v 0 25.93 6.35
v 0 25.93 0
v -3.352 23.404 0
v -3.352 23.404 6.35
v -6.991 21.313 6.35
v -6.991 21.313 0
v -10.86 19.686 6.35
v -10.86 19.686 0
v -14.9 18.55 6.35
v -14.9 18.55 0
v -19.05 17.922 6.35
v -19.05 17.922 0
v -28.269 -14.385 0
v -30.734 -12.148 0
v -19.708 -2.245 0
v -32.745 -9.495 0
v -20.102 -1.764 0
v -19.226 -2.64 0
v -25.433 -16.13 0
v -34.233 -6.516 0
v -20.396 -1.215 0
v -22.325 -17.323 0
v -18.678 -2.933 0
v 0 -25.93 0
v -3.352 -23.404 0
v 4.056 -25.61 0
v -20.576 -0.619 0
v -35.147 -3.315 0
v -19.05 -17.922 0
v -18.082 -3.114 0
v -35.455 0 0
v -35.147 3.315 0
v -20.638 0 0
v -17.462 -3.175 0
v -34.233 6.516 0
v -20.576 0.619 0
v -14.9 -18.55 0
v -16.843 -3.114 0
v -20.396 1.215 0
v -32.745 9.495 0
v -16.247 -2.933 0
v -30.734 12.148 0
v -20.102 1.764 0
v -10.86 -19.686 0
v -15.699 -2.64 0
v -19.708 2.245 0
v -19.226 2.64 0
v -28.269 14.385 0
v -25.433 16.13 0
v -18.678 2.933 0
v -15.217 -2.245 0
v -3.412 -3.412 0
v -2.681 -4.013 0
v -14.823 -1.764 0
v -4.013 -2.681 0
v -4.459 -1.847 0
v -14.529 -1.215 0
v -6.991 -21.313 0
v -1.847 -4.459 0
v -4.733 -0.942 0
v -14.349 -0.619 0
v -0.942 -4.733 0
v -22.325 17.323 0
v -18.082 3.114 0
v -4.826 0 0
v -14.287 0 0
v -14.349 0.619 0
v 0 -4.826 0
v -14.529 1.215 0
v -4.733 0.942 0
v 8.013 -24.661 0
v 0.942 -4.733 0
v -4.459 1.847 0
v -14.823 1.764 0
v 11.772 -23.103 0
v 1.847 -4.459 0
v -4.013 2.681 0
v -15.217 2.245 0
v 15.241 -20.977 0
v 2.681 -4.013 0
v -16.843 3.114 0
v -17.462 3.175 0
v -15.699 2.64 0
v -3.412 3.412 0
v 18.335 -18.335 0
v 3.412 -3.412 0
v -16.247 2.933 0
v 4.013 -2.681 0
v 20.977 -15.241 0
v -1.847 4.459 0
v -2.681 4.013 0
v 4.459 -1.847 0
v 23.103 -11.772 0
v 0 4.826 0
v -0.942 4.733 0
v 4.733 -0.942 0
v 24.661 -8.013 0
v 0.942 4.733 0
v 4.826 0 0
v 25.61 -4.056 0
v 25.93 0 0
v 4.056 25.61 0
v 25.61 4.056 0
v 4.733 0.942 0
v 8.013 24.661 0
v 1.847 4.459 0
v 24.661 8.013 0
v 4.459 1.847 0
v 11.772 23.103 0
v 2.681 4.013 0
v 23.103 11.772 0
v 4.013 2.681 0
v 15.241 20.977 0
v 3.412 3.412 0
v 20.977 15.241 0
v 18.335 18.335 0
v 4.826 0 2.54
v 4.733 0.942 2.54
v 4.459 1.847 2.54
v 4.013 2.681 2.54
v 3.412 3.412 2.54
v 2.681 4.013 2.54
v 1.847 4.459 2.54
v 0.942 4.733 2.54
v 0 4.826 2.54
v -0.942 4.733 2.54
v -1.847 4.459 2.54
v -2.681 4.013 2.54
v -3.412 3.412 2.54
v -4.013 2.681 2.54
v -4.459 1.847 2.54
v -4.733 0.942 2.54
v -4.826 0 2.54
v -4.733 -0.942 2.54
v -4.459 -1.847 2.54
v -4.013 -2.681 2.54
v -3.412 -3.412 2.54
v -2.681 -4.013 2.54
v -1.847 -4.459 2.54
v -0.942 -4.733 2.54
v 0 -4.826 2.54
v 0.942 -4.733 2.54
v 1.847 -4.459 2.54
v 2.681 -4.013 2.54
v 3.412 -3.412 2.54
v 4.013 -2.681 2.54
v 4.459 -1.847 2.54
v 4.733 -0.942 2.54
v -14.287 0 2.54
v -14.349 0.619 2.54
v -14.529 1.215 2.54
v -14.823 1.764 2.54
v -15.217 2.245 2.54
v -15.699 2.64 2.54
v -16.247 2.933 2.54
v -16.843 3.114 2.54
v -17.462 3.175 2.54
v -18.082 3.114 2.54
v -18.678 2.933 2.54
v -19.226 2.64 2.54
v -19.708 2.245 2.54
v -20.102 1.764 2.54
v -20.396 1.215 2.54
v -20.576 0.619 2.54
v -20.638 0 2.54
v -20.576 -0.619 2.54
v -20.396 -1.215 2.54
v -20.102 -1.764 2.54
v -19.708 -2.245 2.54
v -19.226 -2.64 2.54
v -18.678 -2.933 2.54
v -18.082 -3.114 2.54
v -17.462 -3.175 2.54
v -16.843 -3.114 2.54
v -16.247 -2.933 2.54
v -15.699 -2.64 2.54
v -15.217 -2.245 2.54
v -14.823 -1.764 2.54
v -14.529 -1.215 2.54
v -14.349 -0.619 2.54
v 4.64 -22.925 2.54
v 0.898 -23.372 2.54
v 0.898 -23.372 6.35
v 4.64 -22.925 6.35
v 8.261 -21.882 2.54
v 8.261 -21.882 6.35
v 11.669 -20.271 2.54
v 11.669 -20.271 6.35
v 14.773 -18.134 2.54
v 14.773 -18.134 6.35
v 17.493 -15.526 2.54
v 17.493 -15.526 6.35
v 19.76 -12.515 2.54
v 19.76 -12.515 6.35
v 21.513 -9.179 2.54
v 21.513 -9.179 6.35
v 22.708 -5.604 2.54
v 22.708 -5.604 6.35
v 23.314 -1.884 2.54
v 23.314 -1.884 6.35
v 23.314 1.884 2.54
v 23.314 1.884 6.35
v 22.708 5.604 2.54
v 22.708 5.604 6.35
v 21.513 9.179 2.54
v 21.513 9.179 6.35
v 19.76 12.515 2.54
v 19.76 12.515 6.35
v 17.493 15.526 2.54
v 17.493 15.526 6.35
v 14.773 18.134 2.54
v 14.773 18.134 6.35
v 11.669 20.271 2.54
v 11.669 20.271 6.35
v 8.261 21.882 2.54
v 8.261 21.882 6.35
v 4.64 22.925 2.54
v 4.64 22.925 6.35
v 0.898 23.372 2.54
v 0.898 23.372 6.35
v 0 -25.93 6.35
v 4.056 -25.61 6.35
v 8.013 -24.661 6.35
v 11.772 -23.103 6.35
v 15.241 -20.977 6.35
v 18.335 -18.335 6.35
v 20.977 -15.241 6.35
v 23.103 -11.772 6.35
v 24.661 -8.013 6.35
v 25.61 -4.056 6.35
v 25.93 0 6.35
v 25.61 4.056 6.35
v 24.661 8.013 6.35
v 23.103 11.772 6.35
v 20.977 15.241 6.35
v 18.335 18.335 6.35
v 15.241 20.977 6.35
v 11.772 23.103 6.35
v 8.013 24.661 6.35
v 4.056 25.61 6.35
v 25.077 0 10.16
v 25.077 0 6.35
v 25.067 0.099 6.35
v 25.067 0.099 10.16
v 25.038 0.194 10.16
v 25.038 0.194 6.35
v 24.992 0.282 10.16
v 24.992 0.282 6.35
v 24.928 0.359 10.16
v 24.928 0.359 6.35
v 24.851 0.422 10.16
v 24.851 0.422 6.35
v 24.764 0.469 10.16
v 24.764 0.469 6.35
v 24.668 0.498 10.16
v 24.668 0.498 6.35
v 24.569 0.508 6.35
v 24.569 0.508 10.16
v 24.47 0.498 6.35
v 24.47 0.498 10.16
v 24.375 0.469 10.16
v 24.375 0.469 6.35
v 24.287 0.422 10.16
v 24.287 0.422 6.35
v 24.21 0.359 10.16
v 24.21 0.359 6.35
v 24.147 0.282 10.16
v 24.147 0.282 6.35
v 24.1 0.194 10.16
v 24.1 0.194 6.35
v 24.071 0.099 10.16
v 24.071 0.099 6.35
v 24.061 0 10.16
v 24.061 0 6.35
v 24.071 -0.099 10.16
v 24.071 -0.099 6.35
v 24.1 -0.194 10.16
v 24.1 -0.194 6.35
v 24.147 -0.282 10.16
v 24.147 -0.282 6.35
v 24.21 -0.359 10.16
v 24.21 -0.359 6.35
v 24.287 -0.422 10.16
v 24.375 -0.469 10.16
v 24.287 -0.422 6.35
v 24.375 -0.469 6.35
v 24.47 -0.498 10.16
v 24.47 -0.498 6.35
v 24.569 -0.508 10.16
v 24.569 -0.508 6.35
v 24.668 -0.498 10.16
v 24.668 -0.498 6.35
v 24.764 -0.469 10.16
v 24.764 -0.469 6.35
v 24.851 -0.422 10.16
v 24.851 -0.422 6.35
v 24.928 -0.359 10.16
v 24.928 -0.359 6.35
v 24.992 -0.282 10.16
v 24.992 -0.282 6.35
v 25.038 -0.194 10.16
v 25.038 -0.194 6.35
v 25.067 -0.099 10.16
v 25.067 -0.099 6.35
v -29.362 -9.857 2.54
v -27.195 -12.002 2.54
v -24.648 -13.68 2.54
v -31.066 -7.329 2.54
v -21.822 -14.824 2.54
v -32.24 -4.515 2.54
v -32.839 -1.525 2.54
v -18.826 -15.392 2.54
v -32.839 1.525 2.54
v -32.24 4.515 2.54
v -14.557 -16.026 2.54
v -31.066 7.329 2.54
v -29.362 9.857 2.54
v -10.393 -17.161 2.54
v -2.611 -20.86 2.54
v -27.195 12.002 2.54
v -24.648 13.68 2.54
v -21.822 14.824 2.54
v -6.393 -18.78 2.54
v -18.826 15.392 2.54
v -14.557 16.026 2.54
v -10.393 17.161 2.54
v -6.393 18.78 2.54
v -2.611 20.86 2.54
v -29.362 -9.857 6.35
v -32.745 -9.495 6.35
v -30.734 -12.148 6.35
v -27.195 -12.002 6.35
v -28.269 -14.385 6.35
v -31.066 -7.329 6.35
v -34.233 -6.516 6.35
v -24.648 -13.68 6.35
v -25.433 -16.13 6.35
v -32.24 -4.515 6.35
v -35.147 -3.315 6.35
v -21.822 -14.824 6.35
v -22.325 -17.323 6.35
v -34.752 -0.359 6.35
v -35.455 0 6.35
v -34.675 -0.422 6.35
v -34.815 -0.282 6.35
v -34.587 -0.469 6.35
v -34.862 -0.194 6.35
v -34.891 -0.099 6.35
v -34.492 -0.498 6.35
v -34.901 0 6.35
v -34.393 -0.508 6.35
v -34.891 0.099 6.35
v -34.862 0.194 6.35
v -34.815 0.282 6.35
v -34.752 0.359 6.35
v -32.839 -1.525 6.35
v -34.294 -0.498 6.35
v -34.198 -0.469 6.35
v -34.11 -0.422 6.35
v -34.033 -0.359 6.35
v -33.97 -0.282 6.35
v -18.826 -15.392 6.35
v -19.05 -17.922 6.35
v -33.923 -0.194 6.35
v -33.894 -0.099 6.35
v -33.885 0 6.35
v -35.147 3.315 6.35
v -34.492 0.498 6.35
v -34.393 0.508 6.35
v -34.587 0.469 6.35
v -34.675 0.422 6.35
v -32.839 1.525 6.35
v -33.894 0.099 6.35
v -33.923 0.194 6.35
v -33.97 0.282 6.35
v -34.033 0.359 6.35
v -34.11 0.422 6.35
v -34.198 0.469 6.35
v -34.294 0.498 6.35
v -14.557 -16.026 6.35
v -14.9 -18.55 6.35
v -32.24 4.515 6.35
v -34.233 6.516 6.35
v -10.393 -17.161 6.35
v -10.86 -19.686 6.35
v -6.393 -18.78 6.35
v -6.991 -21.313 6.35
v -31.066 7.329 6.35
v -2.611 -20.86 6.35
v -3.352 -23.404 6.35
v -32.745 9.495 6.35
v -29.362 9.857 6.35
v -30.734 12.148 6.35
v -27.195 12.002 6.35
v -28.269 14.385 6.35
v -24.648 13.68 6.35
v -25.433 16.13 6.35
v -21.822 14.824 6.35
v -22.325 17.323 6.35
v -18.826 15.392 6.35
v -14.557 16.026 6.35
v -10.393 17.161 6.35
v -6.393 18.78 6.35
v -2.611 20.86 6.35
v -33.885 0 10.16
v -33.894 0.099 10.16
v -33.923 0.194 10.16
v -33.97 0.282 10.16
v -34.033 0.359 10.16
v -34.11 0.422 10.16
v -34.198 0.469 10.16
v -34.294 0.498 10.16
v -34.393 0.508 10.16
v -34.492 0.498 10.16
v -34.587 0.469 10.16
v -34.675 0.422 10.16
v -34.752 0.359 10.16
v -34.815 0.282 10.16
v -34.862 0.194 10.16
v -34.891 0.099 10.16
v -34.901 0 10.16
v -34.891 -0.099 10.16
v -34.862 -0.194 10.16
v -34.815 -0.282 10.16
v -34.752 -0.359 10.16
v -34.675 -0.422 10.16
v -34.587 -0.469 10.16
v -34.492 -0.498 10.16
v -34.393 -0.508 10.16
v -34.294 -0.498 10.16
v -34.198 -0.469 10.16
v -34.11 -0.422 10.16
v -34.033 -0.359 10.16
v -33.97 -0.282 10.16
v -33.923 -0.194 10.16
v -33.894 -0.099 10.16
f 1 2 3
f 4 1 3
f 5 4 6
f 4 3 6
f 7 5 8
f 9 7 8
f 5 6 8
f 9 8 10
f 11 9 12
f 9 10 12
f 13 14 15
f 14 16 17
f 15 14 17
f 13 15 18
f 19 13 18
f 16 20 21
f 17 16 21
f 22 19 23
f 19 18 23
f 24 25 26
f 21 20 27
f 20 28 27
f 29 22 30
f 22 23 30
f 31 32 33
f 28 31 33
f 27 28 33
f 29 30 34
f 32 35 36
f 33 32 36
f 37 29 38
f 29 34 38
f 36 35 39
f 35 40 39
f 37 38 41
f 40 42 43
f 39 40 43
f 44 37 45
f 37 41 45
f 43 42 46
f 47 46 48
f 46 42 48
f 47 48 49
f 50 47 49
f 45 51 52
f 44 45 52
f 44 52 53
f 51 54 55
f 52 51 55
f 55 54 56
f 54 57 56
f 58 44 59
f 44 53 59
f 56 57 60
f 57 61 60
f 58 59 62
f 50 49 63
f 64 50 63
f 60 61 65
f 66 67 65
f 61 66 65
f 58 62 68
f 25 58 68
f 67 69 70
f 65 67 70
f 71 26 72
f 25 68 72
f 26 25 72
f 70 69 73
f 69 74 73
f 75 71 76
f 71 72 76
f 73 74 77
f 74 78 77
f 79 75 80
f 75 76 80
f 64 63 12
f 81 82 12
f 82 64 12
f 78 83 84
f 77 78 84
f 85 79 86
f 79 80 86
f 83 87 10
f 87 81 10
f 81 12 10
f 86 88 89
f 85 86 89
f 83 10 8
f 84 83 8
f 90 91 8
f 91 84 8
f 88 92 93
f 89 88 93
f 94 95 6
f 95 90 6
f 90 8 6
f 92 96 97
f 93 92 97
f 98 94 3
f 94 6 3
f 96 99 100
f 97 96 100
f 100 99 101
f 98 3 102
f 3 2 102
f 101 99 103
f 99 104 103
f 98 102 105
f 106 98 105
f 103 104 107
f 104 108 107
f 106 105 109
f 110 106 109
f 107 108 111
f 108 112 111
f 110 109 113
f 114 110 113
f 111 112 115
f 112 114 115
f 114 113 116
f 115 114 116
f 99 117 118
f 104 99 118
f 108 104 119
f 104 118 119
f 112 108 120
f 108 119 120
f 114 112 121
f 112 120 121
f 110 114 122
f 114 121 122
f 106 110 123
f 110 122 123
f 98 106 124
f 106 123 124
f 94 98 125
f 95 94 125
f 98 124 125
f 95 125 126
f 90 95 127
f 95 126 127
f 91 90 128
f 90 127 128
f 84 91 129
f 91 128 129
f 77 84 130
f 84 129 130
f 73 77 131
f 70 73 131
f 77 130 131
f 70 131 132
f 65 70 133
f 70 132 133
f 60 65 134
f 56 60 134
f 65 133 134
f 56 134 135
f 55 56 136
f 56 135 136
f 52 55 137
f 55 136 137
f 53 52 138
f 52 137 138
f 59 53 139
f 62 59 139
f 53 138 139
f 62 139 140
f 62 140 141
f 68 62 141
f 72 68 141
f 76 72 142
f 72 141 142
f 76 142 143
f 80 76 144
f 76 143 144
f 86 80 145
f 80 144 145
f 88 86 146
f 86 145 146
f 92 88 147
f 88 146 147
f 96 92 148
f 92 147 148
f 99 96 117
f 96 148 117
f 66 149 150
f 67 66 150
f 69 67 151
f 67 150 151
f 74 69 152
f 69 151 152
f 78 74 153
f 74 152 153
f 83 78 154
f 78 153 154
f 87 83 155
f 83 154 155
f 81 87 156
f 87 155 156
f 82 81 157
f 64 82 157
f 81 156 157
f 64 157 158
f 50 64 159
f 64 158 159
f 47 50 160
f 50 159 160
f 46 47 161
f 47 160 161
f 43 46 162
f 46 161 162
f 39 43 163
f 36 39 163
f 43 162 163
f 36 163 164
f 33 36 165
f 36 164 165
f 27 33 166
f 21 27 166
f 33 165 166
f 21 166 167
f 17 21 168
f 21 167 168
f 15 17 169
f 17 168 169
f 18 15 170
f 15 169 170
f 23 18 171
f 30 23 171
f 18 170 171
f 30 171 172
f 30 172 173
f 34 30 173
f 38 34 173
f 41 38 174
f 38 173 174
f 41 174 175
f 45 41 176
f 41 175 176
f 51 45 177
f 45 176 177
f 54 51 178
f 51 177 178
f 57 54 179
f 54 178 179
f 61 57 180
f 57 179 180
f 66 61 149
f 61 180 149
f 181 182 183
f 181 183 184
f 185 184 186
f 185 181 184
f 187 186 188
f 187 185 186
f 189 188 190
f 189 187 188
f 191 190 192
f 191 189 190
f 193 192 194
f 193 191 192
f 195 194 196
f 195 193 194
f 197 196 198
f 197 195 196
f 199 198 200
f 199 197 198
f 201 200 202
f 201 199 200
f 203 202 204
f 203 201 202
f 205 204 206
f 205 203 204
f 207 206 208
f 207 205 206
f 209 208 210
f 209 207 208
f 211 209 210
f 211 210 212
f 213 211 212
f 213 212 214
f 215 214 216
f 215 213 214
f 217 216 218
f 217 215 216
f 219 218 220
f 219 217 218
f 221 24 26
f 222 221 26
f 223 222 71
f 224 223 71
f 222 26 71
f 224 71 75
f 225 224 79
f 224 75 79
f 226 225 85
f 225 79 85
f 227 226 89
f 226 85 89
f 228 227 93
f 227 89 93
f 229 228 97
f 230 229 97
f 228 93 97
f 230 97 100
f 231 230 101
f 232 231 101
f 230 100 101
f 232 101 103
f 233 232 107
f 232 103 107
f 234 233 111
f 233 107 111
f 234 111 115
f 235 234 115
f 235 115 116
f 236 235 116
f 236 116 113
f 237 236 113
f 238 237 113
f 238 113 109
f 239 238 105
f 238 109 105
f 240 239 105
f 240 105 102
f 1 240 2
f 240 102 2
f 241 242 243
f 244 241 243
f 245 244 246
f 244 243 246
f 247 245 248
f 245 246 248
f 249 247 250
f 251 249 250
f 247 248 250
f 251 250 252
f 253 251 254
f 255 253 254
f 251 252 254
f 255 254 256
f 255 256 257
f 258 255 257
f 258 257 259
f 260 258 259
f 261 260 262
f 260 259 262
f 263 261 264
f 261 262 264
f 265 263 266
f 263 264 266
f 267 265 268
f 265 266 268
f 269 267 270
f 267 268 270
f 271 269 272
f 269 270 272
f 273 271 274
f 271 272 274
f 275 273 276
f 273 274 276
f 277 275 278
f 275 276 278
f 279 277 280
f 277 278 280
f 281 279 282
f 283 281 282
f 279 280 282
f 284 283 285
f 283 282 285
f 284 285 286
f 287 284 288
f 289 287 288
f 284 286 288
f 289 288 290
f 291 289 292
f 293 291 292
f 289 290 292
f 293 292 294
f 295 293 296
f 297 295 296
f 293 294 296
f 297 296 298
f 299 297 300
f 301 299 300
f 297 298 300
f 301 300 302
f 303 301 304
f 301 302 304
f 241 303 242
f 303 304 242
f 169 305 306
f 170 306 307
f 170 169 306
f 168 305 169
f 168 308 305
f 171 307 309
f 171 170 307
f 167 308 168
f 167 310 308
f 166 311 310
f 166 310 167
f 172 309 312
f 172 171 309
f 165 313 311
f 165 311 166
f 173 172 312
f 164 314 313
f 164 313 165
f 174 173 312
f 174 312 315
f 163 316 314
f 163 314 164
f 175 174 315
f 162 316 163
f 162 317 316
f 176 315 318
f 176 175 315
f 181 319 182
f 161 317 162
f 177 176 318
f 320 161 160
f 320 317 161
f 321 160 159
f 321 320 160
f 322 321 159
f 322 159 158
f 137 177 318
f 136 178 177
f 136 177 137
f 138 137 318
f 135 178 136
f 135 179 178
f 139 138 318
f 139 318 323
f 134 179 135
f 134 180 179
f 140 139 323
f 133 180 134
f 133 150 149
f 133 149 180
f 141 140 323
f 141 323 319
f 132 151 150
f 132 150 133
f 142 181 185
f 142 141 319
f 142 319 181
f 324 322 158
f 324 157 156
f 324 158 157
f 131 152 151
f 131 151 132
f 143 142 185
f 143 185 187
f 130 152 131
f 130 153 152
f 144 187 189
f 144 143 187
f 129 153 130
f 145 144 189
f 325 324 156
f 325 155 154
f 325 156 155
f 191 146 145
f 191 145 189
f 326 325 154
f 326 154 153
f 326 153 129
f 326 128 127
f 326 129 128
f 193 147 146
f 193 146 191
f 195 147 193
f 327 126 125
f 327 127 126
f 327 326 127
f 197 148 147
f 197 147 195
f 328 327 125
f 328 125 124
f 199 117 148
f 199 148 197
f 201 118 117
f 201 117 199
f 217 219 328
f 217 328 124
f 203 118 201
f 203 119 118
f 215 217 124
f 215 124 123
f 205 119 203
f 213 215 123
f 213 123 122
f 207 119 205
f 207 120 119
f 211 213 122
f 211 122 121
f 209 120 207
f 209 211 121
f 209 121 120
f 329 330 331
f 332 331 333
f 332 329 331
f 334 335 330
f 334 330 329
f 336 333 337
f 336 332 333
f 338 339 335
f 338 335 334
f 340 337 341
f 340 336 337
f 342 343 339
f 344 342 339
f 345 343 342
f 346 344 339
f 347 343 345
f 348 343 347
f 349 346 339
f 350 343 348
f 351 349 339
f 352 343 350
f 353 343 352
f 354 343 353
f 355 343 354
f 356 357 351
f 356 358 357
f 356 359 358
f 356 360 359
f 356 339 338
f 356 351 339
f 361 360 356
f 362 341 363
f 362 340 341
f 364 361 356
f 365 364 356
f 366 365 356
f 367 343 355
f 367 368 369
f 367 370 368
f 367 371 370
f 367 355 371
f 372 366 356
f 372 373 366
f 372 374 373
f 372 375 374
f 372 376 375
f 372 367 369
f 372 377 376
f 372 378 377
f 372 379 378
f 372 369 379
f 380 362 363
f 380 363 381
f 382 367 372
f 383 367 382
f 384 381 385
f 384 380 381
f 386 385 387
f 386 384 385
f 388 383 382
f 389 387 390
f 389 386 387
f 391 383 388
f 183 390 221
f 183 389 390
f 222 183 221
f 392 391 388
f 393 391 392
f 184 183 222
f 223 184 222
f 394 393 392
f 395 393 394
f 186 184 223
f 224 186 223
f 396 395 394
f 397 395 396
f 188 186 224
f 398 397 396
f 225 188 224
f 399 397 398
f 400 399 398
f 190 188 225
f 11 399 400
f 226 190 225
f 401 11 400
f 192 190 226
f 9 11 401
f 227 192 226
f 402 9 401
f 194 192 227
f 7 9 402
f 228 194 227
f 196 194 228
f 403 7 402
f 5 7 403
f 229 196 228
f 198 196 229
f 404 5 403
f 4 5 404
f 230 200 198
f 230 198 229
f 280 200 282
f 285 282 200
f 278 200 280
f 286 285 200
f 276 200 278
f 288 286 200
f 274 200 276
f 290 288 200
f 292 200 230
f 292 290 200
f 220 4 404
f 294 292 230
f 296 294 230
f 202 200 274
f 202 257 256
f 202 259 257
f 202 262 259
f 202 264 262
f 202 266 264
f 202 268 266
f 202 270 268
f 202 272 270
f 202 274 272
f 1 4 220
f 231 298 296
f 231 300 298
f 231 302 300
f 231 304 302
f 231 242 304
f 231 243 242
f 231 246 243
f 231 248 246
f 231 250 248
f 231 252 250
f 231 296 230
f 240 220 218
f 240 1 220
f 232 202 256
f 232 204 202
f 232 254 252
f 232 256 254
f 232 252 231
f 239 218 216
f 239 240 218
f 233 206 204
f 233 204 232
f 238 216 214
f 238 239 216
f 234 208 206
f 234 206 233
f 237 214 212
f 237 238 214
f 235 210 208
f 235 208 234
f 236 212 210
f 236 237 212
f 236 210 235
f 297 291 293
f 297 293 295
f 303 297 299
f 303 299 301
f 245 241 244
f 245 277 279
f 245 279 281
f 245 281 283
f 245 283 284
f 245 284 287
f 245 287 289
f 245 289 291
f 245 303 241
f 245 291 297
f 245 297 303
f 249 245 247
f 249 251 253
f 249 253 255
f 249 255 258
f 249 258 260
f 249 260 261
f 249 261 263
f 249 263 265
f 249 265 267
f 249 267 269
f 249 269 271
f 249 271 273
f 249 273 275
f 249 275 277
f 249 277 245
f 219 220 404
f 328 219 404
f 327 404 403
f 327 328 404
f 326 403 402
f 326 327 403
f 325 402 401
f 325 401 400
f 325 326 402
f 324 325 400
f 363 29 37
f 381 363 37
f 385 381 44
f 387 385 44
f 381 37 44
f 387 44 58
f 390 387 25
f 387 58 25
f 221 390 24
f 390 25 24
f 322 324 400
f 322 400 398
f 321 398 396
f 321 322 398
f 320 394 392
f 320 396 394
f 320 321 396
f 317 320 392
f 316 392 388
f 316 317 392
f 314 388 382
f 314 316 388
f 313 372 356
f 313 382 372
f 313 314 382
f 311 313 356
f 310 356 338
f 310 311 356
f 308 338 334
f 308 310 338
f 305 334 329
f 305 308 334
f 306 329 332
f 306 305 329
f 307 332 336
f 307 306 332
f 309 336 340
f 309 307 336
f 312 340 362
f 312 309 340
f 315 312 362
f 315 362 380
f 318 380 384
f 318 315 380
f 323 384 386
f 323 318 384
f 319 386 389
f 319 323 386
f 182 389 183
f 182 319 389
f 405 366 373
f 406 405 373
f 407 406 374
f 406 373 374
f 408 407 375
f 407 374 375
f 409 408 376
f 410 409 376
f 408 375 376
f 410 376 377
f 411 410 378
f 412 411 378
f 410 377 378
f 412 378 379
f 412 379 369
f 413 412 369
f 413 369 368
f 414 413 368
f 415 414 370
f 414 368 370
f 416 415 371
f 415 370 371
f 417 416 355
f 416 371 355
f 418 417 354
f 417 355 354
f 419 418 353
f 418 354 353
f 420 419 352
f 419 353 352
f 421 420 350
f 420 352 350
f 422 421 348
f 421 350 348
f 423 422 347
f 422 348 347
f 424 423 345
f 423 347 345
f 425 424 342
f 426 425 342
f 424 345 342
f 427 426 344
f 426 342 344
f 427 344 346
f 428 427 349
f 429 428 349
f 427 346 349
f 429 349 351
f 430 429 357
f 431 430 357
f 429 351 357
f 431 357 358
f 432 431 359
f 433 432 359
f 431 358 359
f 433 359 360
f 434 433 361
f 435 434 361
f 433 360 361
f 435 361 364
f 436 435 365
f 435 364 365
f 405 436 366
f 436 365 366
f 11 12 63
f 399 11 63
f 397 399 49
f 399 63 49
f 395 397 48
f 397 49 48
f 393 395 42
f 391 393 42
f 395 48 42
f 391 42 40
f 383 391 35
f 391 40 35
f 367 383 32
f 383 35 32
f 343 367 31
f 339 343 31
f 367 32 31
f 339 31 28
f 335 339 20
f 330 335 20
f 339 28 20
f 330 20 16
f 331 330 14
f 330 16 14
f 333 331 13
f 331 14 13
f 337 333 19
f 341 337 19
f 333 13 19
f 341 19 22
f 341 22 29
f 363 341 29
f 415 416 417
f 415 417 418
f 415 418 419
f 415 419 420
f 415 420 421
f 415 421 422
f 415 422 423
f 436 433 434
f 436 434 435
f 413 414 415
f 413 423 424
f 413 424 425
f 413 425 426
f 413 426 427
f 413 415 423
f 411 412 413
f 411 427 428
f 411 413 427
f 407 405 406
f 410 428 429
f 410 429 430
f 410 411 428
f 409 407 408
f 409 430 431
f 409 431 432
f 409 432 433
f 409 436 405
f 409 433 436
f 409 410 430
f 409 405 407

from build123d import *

# Parameters (mm, degrees)
BOSS_EXTRUDE1_DEPTH = 6.35
SHELL1_T            = -2.54
SKETCH2_R           = 0.508
BOSS_EXTRUDE2_DEPTH = 3.81
SKETCH3_R           = 4.826
SKETCH3_R_2         = 3.175
CUT_EXTRUDE1_DEPTH  = 2.54


with BuildPart() as part:
    # Sketch1 → Boss-Extrude1 (new body)
    with BuildSketch(Plane.XY):
        with BuildLine():
            ThreePointArc((0, -25.92959), (25.92959, 0), (0, 25.92959))
            ThreePointArc((0, 25.92959), (-8.900253562, 20.439501874), (-19.05, 17.921918042))
            ThreePointArc((-19.05, 17.921918042), (-35.45459, 0), (-19.05, -17.921918042))
            ThreePointArc((-19.05, -17.921918042), (-8.900253562, -20.439501874), (0, -25.92959))
        make_face()
    extrude(amount=BOSS_EXTRUDE1_DEPTH)

    # Shell1
    shell1_openings = [part.faces().sort_by_distance(p)[0] for p in [
        (-3.11409352, 0, 6.35),
    ]]
    offset(amount=SHELL1_T, openings=shell1_openings, kind=Kind.INTERSECTION)

    # Sketch2 → Boss-Extrude2 (add)
    with BuildSketch(Plane.XY.offset(6.35)):
        with Locations((-34.39268404, 0)):
            Circle(SKETCH2_R)
        with Locations((24.569143143, 0)):
            Circle(SKETCH2_R)
    extrude(amount=BOSS_EXTRUDE2_DEPTH)

    # Sketch3 → Cut-Extrude1 (cut)
    with BuildSketch(Plane.XY.offset(2.54)):
        Circle(SKETCH3_R)
        with Locations((-17.4625, 0)):
            Circle(SKETCH3_R_2)
    extrude(amount=-CUT_EXTRUDE1_DEPTH, mode=Mode.SUBTRACT)


solid = part.part
